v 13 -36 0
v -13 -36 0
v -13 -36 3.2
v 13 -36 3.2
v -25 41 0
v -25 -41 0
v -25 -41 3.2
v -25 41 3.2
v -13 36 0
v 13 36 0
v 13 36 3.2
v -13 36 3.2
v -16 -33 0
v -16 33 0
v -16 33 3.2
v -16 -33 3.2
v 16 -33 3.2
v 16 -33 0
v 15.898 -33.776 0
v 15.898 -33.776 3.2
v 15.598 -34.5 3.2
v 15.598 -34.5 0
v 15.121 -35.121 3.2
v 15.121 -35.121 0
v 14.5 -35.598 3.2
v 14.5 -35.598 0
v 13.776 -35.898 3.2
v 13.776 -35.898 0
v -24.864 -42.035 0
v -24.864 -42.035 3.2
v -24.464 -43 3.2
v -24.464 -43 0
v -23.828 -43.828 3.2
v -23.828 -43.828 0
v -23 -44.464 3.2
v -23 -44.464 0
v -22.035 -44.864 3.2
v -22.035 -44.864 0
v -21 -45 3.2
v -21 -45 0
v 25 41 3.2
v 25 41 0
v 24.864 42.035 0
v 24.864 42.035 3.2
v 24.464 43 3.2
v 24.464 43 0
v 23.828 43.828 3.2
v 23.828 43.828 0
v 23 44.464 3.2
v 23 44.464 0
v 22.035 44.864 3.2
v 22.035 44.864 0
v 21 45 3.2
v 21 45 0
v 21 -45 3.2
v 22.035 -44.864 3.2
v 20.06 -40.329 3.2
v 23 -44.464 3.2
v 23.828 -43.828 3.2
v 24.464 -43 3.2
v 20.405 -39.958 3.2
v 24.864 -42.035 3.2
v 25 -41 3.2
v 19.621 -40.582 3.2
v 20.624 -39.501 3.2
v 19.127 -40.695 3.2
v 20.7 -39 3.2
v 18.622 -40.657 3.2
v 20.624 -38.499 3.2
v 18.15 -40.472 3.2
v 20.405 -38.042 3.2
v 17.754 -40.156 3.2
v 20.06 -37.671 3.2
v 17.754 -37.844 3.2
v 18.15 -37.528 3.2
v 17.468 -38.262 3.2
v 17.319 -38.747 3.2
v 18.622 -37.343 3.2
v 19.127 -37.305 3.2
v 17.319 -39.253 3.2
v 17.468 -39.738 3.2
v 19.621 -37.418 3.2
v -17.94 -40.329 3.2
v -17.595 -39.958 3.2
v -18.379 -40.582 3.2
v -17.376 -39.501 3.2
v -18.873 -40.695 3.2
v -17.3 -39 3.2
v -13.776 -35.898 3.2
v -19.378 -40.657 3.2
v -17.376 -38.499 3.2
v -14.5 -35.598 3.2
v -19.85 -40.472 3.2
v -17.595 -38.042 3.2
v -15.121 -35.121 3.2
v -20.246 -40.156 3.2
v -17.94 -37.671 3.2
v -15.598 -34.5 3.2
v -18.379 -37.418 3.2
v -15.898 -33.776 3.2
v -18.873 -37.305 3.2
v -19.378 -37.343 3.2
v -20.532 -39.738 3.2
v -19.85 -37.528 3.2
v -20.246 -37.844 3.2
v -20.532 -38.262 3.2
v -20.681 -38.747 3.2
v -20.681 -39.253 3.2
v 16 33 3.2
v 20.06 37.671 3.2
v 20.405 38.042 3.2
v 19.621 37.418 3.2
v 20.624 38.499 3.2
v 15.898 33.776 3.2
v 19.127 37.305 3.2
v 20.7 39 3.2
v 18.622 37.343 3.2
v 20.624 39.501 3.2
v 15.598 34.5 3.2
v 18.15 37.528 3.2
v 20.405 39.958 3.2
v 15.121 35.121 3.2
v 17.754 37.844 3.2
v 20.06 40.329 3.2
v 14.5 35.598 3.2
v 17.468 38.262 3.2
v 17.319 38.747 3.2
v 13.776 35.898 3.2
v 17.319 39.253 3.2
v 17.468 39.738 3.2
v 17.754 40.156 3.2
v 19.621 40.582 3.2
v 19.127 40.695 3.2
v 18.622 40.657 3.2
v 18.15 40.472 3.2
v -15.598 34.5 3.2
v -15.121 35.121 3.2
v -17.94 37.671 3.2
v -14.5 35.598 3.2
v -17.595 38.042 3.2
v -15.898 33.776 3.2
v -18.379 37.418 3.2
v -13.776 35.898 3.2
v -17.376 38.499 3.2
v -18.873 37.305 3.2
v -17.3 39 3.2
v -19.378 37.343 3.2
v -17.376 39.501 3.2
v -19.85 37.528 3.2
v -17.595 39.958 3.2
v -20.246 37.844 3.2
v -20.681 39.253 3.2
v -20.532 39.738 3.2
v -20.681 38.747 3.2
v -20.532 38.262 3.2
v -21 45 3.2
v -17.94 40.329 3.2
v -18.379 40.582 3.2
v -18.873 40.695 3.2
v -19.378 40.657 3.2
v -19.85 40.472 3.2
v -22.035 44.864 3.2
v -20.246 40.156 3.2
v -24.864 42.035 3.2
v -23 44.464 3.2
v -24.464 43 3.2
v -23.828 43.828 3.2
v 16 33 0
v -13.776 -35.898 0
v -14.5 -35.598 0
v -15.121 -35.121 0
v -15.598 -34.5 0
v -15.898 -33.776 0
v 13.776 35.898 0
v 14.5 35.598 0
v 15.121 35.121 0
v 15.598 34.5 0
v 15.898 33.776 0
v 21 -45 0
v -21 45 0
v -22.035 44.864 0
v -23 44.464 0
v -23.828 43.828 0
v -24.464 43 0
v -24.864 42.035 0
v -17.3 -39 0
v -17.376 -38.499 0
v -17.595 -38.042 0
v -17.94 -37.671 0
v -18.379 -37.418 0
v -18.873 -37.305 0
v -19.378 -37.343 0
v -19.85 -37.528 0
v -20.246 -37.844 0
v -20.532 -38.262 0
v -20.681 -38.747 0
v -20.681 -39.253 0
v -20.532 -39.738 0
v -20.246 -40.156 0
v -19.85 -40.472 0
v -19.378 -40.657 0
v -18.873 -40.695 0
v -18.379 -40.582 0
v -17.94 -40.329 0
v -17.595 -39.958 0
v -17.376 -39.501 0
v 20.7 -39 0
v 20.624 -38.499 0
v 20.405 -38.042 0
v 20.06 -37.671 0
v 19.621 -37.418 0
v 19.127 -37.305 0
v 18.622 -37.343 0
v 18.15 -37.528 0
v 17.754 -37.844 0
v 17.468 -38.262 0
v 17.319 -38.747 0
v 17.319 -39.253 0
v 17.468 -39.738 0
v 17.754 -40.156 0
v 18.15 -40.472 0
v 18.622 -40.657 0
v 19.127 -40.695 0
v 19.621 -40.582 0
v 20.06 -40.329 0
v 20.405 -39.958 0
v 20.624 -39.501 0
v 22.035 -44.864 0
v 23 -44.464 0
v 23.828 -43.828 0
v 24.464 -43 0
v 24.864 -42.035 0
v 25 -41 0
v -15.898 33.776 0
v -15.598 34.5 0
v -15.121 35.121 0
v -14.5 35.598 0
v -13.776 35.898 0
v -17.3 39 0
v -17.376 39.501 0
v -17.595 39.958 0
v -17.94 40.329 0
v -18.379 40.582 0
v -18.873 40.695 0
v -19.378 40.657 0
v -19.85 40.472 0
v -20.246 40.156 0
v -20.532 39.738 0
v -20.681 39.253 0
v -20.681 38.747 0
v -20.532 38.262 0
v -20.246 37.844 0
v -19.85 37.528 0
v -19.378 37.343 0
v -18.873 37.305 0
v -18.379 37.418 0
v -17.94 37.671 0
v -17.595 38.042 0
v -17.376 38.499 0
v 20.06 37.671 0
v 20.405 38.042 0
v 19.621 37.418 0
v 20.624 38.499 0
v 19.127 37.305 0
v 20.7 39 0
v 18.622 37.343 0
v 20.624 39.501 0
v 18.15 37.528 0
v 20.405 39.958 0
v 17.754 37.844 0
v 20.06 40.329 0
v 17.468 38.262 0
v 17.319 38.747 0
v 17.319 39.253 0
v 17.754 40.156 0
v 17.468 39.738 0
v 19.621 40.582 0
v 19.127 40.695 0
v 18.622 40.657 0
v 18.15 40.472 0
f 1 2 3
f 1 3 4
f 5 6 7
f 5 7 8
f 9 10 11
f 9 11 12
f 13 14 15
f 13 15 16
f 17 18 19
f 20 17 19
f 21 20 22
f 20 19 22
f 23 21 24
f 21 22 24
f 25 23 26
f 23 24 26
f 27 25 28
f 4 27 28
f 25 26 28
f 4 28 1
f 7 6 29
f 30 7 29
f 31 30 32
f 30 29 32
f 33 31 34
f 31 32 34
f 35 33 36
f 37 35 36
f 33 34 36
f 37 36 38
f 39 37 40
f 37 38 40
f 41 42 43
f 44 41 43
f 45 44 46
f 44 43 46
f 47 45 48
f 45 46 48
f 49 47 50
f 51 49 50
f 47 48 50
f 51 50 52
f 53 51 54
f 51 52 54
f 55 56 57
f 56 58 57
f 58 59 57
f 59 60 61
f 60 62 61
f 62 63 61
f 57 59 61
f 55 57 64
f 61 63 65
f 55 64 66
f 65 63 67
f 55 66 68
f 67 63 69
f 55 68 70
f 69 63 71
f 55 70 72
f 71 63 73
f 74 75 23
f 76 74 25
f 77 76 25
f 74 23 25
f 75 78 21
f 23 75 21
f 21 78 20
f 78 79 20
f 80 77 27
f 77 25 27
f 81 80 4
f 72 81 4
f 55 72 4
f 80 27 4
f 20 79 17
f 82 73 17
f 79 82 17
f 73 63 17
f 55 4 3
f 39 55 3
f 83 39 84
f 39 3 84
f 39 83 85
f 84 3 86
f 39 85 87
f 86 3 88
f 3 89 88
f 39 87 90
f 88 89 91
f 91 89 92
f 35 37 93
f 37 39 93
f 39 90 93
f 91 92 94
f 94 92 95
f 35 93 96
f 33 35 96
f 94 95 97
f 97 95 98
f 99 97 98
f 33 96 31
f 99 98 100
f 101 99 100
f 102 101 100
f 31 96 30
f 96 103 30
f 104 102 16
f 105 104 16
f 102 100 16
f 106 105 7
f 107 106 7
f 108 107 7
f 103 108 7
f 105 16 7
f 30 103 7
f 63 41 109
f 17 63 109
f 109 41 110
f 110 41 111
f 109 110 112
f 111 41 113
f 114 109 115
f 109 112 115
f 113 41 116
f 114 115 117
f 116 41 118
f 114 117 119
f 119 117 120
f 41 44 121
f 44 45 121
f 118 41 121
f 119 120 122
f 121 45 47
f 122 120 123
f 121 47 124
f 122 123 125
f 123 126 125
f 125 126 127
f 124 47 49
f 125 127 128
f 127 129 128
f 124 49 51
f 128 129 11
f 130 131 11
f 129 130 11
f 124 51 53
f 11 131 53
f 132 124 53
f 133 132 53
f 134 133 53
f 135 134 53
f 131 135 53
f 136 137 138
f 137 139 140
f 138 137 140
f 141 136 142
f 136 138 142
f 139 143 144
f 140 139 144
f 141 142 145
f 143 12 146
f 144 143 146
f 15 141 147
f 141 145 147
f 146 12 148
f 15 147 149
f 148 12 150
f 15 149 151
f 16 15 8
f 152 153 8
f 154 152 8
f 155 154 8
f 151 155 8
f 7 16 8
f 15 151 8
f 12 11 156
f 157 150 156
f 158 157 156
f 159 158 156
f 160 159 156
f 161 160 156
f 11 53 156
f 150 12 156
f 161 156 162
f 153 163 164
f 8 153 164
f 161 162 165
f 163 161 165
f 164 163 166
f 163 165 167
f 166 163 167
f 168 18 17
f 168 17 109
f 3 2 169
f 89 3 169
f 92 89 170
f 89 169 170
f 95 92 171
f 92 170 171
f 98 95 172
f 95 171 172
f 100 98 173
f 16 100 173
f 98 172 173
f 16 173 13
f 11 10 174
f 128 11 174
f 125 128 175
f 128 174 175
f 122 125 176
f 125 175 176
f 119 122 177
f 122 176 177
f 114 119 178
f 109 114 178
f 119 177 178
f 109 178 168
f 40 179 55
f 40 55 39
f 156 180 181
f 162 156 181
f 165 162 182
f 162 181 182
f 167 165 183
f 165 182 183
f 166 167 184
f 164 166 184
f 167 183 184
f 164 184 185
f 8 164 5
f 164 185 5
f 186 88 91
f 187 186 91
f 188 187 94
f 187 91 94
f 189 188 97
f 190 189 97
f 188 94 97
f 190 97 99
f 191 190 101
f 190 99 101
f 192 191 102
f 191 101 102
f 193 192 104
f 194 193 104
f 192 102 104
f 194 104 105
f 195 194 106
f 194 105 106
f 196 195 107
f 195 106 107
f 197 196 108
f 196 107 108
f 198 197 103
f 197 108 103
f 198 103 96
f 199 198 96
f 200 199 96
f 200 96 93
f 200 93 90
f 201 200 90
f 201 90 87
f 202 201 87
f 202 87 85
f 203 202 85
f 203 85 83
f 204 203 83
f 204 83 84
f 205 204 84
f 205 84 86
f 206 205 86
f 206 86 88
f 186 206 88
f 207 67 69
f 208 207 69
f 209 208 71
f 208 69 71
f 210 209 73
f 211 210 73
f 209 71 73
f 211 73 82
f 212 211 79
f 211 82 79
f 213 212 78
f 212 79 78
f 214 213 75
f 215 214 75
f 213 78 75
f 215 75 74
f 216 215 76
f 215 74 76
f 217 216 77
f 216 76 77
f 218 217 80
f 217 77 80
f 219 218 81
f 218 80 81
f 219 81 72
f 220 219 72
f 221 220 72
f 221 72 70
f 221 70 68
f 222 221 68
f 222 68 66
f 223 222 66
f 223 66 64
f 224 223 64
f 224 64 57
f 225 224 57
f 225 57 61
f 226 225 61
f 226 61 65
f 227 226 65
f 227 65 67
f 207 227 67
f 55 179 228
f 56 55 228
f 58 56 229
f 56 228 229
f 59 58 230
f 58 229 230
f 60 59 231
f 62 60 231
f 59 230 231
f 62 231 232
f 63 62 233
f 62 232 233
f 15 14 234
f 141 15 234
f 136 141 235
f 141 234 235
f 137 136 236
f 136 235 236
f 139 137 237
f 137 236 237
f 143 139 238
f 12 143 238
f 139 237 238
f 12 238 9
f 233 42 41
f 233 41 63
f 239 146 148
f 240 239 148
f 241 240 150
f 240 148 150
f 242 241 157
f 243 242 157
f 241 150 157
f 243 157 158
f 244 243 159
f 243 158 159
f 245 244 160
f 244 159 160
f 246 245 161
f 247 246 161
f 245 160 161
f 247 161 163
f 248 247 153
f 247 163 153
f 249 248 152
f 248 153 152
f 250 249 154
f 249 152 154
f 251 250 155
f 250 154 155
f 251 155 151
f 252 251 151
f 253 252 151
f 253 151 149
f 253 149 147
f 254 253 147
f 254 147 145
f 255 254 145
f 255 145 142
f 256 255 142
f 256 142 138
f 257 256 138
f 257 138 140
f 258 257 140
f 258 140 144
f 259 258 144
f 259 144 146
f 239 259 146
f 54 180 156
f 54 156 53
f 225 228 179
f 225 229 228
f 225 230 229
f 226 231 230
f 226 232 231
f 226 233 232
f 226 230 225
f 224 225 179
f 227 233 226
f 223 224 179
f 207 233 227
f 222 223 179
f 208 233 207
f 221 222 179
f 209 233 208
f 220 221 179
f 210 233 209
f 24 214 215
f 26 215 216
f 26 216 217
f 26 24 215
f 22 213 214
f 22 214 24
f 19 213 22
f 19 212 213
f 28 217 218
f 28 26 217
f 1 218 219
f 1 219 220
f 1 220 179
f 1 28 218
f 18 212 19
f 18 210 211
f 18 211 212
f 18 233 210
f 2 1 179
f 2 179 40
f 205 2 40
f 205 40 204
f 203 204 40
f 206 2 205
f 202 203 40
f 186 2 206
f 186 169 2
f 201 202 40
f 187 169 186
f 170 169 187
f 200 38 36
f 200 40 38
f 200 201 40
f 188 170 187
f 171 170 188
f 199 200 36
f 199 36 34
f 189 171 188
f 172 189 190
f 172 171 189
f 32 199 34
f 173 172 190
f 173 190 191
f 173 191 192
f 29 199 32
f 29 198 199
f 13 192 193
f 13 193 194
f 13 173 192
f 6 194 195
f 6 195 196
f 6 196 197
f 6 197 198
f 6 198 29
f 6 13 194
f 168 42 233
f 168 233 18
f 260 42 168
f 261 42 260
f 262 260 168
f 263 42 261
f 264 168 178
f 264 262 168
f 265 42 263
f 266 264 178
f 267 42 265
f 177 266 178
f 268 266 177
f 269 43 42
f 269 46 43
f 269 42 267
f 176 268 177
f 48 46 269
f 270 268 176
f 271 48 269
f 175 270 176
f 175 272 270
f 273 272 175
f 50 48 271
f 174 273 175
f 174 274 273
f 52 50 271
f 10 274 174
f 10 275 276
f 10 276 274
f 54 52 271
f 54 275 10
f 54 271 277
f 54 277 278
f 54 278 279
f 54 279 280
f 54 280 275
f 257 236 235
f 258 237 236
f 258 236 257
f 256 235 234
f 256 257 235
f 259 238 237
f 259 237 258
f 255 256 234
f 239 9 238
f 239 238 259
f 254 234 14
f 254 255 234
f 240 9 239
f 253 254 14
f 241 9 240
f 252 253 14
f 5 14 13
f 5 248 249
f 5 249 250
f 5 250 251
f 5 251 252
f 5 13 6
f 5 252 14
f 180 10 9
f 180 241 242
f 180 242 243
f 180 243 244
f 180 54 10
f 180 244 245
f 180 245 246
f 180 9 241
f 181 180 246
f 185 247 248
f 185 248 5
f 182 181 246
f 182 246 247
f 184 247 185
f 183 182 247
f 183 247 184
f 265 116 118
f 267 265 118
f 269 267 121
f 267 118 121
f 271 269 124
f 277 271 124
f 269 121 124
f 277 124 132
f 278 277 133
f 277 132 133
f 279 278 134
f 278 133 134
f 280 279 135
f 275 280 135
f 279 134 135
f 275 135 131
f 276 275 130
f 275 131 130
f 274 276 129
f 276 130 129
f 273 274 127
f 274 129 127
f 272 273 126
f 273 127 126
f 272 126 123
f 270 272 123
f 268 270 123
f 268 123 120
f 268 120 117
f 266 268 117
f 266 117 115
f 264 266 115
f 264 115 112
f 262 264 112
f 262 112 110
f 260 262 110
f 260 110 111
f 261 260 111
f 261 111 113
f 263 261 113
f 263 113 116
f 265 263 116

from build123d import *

# Parameters (mm, degrees)
PAD_DEPTH       = 3.2
SKETCH007_R     = 1.7
POCKET003_DEPTH = 3.201
POCKET_DEPTH    = 3.201


with BuildPart() as part:
    # Sketch → Pad (new body)
    with BuildSketch(Plane.XY):
        with BuildLine():
            Line((-21, 45), (21, 45))
            ThreePointArc((25, 41), (23.828427, 43.828427), (21, 45))
            Line((25, 41), (25, -41))
            ThreePointArc((21, -45), (23.828427, -43.828427), (25, -41))
            Line((21, -45), (-21, -45))
            ThreePointArc((-25, -41), (-23.828427, -43.828427), (-21, -45))
            Line((-25, -41), (-25, 41))
            ThreePointArc((-21, 45), (-23.828427, 43.828427), (-25, 41))
        make_face()
    extrude(amount=PAD_DEPTH)

    # Sketch007 → Pocket003 (cut, through all)
    with BuildSketch(Plane.XY.offset(3.2)):
        with Locations((-19, 39)):
            Circle(SKETCH007_R)
        with Locations((19, 39)):
            Circle(SKETCH007_R)
        with Locations((-19, -39)):
            Circle(SKETCH007_R)
        with Locations((19, -39)):
            Circle(SKETCH007_R)
    extrude(amount=-POCKET003_DEPTH, mode=Mode.SUBTRACT)

    # Sketch001 (on Face9 of Pad) → Pocket (cut, through all)
    with BuildSketch(Plane(origin=(0, 0, 0), x_dir=(1, 0, 0), z_dir=(0, 0, -1))):
        with BuildLine():
            Line((-13, 36), (13, 36))
            ThreePointArc((16, 33), (15.12132, 35.12132), (13, 36))
            Line((16, 33), (16, -33))
            ThreePointArc((13, -36), (15.12132, -35.12132), (16, -33))
            Line((13, -36), (-13, -36))
            ThreePointArc((-16, -33), (-15.12132, -35.12132), (-13, -36))
            Line((-16, -33), (-16, 33))
            ThreePointArc((-13, 36), (-15.12132, 35.12132), (-16, 33))
        make_face()
    extrude(amount=-POCKET_DEPTH, mode=Mode.SUBTRACT)


solid = part.part
